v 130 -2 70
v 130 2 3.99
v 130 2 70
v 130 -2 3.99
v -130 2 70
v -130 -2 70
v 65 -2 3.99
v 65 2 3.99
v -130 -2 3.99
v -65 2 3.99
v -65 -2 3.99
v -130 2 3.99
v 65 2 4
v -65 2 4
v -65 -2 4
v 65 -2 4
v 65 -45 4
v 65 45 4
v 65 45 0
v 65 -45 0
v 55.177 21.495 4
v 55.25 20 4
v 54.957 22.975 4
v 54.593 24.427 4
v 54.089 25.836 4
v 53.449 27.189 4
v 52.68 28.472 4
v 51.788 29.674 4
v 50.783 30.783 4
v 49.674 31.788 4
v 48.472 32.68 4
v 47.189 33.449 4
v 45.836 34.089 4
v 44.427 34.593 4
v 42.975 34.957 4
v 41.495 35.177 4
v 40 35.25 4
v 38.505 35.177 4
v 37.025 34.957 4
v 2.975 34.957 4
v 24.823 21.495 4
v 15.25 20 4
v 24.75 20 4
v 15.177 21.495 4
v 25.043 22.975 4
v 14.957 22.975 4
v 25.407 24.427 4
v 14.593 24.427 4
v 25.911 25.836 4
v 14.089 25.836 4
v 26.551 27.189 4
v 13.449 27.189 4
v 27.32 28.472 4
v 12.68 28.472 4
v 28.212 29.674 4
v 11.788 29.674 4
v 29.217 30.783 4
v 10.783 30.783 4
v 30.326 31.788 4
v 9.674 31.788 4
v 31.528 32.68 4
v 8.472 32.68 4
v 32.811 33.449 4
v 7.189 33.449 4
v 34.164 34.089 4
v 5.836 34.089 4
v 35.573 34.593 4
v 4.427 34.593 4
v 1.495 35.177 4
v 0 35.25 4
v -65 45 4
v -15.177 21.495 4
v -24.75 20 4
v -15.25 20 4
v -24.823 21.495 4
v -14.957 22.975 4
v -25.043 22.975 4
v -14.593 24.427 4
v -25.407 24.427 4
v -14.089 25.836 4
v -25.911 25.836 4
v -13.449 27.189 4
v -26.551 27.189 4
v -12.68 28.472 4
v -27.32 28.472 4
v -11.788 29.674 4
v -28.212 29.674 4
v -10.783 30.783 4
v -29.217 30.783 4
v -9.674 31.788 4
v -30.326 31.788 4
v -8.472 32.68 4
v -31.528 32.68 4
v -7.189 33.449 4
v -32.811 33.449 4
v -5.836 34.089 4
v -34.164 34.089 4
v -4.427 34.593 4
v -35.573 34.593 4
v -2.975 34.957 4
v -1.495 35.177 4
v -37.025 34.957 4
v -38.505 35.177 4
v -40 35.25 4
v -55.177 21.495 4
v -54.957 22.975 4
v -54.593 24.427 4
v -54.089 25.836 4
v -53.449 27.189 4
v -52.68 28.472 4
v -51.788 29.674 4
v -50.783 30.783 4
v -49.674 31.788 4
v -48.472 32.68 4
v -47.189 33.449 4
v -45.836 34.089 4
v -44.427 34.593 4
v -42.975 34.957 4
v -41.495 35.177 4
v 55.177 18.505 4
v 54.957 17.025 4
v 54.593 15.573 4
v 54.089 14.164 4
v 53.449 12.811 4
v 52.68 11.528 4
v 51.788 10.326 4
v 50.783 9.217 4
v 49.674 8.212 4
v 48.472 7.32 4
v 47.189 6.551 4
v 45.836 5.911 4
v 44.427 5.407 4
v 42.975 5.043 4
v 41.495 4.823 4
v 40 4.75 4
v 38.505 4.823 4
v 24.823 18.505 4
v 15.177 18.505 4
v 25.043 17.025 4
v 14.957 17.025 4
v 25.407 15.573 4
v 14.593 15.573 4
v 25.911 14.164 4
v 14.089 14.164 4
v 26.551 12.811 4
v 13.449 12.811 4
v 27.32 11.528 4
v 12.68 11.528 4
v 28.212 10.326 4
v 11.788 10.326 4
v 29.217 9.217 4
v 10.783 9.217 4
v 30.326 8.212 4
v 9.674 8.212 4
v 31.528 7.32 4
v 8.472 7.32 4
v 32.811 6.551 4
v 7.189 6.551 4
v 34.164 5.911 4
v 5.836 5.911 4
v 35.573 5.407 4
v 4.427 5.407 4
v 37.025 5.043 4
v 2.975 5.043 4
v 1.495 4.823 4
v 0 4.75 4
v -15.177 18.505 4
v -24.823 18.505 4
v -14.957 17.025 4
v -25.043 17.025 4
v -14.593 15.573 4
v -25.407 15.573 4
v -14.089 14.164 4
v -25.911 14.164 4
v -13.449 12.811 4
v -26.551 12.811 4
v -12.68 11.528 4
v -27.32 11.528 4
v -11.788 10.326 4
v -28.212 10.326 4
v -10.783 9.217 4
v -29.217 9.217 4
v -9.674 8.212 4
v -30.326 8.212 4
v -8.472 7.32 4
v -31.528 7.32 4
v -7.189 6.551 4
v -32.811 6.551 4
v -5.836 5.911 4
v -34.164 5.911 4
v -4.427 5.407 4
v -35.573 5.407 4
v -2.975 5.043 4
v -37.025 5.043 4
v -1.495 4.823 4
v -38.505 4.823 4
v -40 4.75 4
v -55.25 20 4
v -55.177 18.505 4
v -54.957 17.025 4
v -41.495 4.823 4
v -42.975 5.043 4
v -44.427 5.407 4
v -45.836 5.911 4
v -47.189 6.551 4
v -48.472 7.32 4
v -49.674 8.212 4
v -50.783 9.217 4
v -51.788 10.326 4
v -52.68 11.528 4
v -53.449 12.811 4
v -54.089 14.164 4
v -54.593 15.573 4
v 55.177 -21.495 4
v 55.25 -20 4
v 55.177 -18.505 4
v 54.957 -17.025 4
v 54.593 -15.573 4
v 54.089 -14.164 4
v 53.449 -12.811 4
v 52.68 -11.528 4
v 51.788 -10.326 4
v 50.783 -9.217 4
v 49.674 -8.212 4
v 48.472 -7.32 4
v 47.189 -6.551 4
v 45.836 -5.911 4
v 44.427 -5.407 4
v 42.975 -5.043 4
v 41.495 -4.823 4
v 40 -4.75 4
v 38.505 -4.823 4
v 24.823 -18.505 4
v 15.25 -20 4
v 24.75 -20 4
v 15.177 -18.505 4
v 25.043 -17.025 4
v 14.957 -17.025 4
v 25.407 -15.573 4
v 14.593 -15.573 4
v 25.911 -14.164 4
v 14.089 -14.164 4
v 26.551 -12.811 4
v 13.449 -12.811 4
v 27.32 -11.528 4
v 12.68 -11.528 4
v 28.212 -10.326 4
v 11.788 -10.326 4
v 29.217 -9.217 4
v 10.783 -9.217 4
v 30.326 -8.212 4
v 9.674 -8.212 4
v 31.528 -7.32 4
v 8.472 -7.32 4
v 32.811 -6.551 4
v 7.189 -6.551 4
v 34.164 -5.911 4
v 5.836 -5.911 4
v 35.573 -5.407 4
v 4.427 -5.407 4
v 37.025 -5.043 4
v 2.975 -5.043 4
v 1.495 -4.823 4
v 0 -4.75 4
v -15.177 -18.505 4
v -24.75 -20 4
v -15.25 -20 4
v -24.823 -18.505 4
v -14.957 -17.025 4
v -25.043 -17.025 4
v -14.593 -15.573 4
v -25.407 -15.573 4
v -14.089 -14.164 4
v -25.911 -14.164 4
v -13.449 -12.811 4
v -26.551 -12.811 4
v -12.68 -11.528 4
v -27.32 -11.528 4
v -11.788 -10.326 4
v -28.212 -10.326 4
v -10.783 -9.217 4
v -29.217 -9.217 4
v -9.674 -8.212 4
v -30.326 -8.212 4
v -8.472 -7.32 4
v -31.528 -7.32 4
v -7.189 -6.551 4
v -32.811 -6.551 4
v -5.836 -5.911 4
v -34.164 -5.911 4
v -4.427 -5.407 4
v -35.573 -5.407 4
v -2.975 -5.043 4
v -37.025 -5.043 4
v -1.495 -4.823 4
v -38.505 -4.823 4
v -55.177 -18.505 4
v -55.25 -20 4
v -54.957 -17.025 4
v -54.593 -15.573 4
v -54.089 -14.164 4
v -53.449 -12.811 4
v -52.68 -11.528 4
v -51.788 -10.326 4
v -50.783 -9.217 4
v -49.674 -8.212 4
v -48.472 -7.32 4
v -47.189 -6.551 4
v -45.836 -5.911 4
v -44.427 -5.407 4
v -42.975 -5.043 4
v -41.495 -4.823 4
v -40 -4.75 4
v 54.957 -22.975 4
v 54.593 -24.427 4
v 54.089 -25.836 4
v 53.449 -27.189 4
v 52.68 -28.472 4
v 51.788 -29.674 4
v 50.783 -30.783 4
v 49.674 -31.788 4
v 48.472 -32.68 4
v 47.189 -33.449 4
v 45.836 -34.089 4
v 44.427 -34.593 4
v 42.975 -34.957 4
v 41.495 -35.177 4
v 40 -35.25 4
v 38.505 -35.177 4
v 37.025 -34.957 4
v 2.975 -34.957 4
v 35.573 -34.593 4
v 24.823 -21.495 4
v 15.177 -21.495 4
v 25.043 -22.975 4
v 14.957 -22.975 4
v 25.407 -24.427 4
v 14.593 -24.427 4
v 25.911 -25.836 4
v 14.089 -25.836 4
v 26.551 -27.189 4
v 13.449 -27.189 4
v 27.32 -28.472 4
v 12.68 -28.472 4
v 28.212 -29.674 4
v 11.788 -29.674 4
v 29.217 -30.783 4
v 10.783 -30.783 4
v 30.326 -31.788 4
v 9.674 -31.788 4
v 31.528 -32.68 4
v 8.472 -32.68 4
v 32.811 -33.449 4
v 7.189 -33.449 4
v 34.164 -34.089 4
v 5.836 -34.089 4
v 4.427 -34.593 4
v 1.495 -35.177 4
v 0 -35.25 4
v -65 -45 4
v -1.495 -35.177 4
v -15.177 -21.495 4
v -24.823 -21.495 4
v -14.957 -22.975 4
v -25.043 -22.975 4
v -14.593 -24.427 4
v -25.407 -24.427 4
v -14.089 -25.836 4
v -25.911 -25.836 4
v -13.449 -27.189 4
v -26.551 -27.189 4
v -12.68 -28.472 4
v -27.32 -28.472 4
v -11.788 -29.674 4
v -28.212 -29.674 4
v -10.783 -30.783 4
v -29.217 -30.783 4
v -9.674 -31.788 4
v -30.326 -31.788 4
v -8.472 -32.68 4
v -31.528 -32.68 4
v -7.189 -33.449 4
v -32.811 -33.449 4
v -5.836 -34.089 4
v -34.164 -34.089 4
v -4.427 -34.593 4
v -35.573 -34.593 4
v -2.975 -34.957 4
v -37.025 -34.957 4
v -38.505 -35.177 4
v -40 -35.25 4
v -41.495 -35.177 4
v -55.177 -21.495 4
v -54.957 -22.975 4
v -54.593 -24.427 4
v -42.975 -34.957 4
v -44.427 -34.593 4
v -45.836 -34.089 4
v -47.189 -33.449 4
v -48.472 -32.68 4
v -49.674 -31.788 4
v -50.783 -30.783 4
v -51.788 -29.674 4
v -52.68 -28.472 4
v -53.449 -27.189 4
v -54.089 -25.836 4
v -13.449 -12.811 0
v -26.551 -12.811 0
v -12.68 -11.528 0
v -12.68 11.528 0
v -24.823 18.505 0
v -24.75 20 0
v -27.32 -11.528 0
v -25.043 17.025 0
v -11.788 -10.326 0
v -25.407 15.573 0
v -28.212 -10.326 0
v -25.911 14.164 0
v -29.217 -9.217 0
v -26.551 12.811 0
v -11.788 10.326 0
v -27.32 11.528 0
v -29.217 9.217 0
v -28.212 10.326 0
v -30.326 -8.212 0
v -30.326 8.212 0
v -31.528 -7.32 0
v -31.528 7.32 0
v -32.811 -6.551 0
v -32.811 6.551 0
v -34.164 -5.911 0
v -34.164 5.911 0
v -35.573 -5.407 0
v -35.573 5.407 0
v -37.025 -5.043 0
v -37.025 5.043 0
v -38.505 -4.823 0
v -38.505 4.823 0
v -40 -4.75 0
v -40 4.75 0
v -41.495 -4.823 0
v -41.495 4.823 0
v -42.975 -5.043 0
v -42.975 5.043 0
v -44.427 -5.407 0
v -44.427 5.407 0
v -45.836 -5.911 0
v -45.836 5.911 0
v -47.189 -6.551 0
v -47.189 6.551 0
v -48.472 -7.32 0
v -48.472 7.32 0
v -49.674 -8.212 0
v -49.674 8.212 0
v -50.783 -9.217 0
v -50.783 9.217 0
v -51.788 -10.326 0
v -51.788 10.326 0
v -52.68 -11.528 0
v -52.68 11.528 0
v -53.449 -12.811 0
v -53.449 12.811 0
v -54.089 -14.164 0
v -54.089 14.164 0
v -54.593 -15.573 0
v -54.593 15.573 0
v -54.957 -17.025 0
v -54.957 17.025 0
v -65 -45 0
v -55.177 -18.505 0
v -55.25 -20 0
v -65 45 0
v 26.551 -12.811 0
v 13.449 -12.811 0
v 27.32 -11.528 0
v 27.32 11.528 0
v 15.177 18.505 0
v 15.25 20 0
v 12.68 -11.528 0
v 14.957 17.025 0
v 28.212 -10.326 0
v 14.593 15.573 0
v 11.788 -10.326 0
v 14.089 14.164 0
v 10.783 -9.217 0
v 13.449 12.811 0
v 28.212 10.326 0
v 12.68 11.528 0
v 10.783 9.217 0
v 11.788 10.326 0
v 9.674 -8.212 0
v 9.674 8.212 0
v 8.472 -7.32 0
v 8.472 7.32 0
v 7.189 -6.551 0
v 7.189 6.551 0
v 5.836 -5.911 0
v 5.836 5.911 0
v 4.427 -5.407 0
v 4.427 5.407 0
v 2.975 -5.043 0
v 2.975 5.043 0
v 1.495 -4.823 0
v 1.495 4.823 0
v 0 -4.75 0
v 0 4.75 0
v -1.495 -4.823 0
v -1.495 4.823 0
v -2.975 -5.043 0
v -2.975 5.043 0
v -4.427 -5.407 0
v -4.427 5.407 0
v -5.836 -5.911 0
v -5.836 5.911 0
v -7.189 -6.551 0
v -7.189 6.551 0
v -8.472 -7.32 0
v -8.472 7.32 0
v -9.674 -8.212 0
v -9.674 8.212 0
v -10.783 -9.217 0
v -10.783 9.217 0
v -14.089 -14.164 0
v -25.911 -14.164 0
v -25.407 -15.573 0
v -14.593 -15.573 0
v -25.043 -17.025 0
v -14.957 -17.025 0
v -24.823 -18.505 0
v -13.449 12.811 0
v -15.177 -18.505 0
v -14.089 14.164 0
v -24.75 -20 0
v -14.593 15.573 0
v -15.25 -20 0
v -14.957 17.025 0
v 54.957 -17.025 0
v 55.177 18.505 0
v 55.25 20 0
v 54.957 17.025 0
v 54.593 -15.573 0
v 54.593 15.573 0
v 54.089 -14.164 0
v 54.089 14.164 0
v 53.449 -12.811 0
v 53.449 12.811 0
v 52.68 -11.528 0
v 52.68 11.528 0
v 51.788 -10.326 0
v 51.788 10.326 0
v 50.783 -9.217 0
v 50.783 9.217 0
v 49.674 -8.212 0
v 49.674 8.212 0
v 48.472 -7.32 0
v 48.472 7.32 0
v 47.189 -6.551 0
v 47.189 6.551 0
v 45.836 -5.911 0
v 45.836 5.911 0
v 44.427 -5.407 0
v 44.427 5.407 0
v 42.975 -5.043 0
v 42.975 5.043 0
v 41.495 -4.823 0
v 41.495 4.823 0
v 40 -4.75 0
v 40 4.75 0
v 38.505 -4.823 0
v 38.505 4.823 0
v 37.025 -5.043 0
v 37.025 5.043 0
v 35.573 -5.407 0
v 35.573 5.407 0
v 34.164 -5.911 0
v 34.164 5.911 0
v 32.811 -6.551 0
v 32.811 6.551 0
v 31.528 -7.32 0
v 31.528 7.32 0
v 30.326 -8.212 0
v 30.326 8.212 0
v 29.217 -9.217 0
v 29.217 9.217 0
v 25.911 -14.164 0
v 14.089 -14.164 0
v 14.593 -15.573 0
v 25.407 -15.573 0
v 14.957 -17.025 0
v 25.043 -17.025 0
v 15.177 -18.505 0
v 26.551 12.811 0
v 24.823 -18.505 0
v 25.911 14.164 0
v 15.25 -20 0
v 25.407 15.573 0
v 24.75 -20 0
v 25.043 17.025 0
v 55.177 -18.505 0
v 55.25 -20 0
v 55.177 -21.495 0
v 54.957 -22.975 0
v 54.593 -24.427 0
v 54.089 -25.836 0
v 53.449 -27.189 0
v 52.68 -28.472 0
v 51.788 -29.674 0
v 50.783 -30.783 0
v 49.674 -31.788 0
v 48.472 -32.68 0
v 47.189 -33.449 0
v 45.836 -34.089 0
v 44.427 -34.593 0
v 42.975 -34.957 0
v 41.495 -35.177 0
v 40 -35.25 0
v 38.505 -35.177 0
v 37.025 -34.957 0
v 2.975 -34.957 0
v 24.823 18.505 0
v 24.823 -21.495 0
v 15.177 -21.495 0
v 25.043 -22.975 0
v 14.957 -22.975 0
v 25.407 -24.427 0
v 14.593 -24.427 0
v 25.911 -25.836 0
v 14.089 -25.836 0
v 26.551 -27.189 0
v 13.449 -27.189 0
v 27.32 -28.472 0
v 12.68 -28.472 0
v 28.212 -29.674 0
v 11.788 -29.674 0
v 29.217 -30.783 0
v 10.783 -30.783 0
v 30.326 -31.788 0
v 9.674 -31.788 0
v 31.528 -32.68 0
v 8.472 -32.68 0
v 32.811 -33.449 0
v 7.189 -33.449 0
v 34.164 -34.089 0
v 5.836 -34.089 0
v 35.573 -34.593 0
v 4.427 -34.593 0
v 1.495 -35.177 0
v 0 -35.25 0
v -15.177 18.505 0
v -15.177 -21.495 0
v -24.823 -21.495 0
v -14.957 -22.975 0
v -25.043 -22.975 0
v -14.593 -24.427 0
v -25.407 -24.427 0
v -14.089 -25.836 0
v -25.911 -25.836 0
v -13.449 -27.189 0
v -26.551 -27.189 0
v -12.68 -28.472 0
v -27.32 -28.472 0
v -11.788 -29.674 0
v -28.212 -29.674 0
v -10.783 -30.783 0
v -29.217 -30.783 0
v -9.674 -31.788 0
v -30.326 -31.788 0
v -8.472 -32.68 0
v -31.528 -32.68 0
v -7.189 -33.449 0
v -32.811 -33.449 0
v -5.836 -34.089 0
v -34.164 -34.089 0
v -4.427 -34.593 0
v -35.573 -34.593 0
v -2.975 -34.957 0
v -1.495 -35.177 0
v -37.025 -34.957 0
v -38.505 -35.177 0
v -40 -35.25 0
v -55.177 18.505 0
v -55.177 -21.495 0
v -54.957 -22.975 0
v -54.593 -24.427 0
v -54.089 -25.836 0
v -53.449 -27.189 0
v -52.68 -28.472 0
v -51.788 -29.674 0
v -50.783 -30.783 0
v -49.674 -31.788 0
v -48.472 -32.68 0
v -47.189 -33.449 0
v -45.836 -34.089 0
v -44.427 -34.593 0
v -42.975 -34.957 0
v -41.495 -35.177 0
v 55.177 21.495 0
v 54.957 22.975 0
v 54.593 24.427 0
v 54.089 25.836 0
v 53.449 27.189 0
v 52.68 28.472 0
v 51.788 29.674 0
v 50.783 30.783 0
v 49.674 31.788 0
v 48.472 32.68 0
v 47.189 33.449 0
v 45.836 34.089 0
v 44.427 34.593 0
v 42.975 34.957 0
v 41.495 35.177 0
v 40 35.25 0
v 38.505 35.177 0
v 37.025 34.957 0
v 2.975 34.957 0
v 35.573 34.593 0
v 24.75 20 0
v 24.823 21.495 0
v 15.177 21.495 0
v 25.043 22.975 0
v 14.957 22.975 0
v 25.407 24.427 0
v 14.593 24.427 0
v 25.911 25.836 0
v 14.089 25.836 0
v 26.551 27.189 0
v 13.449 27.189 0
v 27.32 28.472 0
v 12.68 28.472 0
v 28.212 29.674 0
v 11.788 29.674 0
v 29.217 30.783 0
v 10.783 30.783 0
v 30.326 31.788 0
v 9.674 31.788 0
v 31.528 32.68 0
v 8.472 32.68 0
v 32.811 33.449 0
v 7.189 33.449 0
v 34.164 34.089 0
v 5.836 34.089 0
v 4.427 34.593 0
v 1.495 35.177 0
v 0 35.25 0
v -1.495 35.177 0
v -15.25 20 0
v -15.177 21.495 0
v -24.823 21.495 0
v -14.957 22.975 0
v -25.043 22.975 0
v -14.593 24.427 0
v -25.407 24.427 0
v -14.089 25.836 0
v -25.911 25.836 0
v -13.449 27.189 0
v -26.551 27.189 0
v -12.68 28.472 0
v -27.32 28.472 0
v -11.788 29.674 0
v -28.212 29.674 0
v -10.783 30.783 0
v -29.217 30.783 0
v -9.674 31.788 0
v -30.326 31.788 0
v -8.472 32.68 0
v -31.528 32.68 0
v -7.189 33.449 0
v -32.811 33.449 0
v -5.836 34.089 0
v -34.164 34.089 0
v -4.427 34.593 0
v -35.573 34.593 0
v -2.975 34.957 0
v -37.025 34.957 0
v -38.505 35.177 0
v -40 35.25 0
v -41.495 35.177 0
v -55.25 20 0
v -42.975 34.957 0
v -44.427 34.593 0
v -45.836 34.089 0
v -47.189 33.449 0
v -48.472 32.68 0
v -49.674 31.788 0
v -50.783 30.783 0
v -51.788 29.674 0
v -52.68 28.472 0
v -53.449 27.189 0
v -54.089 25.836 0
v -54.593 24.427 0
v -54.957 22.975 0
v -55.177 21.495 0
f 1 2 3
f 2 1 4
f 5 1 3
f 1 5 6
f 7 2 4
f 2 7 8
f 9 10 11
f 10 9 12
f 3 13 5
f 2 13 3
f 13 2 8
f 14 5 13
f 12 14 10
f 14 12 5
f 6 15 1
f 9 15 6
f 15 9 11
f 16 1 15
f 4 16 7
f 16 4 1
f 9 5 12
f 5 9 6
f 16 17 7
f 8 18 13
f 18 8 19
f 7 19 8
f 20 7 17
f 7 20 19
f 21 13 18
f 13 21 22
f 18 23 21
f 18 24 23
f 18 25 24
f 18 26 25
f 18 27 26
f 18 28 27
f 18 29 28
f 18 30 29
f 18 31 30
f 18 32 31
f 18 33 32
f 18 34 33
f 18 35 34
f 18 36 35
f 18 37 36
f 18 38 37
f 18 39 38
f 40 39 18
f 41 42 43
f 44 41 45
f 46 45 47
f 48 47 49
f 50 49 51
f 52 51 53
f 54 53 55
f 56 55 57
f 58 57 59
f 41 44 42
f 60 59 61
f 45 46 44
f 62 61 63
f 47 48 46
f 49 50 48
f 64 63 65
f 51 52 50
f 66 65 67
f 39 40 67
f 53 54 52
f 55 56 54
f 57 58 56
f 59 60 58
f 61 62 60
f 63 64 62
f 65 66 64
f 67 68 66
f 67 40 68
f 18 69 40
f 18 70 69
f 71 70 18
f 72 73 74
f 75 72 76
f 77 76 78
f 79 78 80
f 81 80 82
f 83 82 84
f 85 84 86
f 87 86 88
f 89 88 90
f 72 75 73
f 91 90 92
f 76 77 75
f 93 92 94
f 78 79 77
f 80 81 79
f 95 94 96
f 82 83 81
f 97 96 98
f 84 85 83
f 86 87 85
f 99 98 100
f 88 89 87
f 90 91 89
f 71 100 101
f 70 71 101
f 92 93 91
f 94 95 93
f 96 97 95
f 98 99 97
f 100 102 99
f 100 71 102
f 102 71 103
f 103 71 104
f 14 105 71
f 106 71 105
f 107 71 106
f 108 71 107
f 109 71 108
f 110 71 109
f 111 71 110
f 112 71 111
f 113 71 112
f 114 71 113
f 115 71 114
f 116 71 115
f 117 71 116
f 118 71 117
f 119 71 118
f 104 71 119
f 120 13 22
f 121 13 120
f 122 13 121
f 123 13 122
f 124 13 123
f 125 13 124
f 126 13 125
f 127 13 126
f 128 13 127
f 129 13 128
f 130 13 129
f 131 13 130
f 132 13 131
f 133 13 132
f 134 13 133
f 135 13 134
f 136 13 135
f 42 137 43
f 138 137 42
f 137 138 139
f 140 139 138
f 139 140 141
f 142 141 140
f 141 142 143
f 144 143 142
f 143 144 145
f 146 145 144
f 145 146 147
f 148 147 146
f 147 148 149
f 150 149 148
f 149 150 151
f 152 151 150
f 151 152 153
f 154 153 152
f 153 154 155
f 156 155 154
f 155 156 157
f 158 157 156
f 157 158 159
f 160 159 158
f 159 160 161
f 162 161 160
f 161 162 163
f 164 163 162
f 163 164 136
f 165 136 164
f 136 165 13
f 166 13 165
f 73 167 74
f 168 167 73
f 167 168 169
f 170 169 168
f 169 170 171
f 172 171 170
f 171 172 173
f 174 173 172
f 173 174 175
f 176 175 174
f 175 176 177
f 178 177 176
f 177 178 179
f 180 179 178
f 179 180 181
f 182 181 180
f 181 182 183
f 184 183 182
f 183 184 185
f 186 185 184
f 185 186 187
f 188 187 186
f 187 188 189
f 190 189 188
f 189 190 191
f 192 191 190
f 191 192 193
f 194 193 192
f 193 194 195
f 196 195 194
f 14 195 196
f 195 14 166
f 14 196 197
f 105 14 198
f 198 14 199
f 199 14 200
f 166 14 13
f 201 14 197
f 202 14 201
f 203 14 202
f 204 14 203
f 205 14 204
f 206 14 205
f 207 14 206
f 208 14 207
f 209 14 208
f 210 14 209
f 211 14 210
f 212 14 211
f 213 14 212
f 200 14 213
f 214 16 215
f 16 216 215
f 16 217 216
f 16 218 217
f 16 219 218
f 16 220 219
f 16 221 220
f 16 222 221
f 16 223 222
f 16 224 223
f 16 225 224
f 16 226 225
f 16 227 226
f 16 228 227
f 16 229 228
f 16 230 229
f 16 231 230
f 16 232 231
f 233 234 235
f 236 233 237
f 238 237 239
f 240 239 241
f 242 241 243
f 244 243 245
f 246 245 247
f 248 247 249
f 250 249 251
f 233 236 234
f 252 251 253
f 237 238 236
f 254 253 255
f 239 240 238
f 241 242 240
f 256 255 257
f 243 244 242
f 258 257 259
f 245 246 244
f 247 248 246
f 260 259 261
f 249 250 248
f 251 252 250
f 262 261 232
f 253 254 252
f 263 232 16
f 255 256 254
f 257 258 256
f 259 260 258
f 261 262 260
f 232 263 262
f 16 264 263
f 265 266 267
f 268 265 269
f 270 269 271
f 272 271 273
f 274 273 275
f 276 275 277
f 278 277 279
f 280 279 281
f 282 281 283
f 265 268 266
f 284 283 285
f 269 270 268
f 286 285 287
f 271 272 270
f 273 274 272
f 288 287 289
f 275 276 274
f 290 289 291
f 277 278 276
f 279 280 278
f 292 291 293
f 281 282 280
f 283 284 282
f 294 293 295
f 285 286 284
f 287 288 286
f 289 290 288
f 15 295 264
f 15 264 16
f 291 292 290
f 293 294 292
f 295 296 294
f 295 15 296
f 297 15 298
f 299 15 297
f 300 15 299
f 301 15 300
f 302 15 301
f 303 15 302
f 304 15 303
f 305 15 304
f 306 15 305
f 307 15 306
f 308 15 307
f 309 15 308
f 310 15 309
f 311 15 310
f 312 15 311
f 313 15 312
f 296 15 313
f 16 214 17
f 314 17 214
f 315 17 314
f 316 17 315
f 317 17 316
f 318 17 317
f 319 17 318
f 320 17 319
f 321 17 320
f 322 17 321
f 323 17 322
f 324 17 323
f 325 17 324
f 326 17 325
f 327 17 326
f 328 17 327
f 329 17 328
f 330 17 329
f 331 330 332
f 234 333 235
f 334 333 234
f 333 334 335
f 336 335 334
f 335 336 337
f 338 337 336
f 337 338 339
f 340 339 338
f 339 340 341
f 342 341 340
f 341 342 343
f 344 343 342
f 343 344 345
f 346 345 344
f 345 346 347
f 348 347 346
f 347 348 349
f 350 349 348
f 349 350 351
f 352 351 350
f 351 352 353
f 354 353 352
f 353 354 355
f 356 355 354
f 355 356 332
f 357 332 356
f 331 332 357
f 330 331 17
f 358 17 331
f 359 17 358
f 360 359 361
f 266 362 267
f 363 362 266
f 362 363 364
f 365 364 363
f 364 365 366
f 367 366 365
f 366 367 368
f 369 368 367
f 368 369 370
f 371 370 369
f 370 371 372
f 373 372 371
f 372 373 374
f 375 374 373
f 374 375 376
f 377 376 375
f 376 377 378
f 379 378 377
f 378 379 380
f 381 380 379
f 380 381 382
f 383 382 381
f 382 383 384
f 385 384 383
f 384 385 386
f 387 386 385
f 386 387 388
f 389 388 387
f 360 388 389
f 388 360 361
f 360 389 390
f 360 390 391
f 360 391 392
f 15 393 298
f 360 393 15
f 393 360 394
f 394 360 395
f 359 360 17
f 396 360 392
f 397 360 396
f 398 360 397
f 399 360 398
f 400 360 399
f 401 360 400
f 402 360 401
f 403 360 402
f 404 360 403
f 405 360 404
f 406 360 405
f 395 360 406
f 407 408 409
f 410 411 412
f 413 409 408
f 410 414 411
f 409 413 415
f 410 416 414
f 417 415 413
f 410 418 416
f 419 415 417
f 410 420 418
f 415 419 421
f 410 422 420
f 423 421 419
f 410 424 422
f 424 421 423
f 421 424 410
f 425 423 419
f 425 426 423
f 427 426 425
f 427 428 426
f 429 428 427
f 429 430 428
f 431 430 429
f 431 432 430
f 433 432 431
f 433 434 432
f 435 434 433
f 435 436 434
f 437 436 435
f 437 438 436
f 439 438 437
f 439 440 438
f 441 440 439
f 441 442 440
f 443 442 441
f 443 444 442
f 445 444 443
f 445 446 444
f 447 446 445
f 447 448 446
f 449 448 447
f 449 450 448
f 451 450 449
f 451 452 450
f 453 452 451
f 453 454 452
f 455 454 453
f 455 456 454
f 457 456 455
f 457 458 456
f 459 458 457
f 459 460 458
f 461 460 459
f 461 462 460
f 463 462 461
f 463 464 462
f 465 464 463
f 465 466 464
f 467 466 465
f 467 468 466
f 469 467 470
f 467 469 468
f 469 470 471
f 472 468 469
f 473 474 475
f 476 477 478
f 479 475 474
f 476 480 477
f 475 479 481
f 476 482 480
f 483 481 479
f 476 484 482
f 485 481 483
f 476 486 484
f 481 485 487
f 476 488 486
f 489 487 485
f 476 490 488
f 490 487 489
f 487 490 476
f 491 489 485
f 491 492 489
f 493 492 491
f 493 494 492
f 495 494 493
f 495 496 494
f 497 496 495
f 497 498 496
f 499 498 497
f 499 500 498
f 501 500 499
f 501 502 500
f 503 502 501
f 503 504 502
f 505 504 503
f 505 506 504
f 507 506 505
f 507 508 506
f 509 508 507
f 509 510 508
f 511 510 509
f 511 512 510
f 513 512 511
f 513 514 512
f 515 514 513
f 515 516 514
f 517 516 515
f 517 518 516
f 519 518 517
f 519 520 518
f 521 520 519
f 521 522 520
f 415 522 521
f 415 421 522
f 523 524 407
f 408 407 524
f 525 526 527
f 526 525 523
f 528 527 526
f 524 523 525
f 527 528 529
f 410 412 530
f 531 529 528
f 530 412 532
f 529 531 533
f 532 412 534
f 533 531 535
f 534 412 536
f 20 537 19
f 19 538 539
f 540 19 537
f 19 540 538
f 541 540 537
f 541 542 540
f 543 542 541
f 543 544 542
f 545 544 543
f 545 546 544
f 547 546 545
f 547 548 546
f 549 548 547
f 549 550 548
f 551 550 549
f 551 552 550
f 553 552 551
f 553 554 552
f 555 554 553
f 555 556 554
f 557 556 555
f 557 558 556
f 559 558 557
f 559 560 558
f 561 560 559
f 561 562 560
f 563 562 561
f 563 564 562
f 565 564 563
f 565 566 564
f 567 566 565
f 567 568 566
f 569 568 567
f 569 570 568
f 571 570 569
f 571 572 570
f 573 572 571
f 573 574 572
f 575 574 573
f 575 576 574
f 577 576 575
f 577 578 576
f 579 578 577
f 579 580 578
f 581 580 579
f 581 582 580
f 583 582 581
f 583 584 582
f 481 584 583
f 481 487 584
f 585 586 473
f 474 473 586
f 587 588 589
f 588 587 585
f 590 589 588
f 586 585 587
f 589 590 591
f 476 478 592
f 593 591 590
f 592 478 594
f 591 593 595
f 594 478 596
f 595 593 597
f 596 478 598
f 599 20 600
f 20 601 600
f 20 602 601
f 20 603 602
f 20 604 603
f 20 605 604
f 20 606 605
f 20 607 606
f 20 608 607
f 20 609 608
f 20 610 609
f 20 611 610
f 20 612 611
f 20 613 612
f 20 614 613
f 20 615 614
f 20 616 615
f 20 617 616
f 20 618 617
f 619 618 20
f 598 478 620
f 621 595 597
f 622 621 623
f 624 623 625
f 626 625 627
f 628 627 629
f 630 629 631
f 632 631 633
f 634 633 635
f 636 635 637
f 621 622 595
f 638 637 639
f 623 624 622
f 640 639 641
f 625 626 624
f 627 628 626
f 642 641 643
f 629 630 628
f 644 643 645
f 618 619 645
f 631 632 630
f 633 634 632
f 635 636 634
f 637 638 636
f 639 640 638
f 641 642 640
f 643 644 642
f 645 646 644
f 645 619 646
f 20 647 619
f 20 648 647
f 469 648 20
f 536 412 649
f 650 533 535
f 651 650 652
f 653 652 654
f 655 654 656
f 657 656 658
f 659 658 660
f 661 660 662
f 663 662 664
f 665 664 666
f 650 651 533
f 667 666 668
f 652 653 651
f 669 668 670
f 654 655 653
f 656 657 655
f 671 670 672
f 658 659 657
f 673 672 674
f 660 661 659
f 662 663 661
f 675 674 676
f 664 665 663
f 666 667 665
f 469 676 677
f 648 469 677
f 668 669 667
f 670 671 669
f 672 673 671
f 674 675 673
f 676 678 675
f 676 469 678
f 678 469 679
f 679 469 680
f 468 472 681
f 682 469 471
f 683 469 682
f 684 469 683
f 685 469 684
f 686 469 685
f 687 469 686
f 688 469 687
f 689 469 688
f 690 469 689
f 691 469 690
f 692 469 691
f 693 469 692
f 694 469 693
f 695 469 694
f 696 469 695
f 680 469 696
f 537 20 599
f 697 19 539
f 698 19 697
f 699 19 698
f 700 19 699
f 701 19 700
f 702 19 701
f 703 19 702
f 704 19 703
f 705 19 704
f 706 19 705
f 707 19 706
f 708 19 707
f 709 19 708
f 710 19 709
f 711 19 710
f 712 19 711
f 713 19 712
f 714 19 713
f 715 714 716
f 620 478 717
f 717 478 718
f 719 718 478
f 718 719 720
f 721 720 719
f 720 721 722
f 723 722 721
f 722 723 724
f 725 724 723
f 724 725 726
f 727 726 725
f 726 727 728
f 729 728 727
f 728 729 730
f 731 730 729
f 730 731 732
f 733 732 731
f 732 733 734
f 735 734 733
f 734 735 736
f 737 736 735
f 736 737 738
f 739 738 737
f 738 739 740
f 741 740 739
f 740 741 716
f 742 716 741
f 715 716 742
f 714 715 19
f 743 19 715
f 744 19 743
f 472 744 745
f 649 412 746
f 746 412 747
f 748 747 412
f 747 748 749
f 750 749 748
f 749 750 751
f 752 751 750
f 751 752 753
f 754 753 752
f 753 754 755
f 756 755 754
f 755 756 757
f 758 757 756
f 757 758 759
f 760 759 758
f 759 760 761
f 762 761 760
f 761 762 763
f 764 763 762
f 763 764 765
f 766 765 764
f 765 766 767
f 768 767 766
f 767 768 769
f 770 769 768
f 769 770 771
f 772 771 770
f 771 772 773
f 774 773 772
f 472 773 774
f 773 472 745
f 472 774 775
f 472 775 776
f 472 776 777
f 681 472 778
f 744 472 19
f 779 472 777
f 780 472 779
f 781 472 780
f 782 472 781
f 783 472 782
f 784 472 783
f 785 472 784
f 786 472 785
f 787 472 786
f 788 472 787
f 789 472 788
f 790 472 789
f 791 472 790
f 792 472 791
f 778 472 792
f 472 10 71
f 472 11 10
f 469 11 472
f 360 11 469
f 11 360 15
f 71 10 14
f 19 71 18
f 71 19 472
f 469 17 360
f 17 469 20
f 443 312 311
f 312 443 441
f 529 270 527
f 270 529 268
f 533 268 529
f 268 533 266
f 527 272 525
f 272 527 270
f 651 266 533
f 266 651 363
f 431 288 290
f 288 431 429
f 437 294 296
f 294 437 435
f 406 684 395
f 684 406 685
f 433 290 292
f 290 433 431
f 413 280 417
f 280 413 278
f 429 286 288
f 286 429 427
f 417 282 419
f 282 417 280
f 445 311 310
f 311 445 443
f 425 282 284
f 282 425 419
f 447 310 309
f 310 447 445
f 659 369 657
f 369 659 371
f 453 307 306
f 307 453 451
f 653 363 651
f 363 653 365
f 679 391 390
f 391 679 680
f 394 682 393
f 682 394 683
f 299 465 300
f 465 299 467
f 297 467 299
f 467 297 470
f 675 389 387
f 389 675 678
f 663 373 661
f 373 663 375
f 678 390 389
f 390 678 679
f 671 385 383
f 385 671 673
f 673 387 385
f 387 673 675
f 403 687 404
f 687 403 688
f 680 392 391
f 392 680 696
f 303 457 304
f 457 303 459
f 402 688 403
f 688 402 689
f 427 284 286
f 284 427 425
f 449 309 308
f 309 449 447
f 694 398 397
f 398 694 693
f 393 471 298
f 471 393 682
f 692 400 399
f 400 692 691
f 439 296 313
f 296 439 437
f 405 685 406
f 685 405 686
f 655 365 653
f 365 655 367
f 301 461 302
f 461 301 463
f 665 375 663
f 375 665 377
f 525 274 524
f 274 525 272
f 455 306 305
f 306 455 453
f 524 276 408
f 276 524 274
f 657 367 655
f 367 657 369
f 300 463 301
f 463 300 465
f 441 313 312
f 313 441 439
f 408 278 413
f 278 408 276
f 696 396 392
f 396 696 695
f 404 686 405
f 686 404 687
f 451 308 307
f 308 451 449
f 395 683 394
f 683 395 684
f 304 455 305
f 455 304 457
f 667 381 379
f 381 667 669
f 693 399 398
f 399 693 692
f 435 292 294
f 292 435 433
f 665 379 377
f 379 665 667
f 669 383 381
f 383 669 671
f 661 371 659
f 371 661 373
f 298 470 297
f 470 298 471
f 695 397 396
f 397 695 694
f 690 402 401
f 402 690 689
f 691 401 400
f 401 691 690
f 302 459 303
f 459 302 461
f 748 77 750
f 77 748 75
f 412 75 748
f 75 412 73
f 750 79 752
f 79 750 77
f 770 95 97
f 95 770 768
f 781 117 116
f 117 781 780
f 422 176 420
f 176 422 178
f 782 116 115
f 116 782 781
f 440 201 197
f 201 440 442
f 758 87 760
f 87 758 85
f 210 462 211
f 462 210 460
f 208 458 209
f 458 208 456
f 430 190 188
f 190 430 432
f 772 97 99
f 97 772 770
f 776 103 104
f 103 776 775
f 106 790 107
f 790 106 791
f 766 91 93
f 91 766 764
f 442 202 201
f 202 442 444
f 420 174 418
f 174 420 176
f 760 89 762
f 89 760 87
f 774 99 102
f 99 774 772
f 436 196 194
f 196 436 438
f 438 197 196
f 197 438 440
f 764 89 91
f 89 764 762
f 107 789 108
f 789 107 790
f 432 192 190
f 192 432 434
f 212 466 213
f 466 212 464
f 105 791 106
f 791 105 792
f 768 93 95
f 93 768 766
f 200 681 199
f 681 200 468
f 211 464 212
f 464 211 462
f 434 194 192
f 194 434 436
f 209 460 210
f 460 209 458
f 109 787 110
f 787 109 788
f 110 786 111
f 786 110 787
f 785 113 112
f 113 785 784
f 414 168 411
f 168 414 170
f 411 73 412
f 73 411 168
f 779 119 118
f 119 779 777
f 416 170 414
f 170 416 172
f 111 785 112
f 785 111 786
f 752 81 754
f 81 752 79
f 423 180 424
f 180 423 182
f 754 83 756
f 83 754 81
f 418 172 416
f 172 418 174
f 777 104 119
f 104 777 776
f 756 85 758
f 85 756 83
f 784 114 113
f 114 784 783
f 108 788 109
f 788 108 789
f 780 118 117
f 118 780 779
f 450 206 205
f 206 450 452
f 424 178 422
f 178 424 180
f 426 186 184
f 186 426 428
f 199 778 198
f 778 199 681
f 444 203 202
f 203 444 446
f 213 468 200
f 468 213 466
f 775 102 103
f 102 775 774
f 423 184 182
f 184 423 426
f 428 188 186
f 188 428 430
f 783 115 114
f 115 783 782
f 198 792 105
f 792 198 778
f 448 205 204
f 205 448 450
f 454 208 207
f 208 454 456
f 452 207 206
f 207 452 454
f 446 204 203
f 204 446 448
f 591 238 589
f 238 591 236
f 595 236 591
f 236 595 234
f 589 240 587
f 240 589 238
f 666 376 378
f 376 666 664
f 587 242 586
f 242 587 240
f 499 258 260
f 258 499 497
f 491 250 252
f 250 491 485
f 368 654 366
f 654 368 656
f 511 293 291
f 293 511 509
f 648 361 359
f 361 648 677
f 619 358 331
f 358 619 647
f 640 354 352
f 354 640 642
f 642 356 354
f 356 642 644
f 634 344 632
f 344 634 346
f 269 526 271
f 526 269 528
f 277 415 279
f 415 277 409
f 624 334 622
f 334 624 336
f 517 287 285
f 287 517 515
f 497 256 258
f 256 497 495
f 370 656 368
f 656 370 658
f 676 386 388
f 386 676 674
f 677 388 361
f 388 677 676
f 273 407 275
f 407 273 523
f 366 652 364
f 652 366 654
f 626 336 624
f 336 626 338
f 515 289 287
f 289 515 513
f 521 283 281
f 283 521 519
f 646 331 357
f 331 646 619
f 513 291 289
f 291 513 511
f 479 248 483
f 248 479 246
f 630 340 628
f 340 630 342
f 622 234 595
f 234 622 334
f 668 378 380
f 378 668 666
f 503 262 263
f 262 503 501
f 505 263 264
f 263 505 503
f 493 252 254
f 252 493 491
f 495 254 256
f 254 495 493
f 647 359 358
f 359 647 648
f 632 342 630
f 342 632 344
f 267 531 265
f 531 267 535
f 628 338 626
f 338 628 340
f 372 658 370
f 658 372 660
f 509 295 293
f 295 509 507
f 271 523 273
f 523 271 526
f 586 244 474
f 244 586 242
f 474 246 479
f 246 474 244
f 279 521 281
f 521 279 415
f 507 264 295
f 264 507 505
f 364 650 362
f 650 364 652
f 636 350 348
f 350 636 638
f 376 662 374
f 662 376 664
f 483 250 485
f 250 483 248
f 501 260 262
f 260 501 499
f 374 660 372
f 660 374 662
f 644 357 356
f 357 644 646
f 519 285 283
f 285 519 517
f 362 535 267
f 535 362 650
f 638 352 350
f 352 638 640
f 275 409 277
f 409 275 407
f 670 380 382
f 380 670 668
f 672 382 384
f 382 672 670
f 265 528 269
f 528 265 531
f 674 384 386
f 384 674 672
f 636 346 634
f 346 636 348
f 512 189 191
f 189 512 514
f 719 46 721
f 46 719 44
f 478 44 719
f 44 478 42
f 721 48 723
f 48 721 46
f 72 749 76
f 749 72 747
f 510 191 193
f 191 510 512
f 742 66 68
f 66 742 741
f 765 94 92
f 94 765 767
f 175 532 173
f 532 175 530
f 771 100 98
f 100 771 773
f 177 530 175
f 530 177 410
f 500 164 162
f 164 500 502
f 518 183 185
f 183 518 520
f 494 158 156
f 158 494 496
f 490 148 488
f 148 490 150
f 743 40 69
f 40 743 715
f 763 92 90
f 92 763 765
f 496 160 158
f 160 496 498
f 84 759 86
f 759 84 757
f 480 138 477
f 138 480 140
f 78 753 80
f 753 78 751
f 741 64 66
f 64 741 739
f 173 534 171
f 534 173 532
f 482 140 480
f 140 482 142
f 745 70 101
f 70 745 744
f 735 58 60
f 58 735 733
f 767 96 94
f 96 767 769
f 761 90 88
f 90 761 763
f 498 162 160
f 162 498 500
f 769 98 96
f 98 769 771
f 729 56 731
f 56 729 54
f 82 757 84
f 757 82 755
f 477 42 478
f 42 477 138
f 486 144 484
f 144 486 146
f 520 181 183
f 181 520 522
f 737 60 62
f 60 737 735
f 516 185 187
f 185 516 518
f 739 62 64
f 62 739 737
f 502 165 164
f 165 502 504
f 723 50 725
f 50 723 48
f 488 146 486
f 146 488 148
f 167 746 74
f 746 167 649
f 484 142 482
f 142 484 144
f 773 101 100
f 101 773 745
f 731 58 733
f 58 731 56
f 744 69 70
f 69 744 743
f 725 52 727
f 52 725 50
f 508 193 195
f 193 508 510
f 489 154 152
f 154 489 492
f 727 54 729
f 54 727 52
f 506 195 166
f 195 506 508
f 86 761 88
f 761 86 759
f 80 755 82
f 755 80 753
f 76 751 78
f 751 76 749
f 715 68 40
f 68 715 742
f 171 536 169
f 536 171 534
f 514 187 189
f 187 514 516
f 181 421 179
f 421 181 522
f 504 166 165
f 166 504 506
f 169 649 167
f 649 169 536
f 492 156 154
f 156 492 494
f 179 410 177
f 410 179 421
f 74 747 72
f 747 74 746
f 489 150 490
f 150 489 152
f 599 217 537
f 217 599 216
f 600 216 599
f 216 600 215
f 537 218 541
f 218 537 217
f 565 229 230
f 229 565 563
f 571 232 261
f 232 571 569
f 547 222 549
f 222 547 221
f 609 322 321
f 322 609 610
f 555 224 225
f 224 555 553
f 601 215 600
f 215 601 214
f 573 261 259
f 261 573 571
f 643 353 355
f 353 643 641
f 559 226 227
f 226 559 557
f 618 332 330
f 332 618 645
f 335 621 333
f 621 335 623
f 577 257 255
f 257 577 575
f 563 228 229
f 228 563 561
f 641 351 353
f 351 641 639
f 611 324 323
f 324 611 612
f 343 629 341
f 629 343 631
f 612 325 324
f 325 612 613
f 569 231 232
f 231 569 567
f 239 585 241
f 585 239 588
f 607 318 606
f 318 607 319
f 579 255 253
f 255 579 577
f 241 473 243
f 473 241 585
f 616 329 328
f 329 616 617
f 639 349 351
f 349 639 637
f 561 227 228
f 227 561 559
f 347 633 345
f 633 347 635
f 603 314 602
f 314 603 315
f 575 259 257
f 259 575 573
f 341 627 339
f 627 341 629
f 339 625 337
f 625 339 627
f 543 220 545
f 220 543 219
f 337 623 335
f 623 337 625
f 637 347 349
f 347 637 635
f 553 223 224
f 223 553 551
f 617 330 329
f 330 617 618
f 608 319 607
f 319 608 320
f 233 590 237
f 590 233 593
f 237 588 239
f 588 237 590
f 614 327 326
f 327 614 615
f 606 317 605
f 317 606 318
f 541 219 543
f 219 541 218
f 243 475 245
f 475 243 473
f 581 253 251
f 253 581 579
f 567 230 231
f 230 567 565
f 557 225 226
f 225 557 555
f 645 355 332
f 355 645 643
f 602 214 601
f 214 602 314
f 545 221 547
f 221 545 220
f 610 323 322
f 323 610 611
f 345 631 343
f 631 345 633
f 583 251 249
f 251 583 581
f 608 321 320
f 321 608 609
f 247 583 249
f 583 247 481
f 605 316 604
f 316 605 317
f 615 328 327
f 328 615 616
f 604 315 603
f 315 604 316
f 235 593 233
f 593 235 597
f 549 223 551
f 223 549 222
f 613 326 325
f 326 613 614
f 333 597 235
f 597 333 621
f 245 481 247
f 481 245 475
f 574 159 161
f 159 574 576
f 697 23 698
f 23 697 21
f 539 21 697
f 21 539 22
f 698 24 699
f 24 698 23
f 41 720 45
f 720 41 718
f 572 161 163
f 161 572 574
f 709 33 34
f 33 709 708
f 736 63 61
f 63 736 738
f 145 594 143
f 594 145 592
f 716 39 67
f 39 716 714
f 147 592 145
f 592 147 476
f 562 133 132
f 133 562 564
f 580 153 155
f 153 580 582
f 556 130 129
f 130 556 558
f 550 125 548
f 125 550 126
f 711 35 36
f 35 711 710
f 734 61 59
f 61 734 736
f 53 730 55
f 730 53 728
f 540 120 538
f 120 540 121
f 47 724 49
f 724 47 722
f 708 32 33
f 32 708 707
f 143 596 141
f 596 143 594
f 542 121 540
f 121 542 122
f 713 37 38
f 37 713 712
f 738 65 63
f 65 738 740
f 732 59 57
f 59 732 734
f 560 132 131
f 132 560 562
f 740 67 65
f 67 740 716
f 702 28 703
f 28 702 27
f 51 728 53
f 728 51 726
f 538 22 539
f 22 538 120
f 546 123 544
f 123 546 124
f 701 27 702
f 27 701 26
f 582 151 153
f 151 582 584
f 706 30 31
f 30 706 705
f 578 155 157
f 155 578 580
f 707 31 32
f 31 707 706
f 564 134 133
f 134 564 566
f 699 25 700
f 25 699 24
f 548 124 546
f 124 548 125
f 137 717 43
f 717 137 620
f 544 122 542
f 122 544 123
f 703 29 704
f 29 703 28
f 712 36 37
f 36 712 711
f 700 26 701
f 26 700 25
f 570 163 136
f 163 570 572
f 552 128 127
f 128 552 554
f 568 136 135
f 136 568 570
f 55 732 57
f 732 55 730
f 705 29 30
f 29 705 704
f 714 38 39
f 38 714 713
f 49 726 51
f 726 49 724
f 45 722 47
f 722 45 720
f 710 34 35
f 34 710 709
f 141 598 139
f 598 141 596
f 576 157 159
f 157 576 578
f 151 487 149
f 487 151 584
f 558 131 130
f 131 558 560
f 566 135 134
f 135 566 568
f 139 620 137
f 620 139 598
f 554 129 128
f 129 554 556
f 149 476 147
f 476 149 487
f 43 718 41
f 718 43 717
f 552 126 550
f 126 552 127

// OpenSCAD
// Rack for six 50 mL conical (Falcon-type) tubes
// Print orientation: flat plate on the bed, holes vertical.
// After printing, flip over so the two wall strips become legs.

$fn = 64;

// ---- Plate ----
plate_x = 130;      // plate length along X
plate_y = 90;       // plate width along Y
plate_t = 4;        // plate thickness (z = 0 to 4)

// ---- Holes ----
hole_d     = 30.5;  // tube hole diameter
hole_nx    = 3;     // holes along X
hole_ny    = 2;     // holes along Y
hole_pitch = 40;    // centre-to-centre spacing (both directions)

// ---- Walls ----
wall_len = plate_x; // wall length along X
wall_t   = 4;       // wall thickness along Y
wall_h   = 66;      // wall height above plate (z = 4 to 70)

eps = 0.5;          // cutter overshoot

difference() {
    union() {
        // Base plate
        translate([-plate_x/2, -plate_y/2, 0])
            cube([plate_x, plate_y, plate_t]);

        // Two solid walls along the long edges
        for (a = [0, 180])
            rotate([0, 0, a])
                translate([0, -wall_t/2, plate_t - 0.01])
                    cube([wall_len, wall_t, wall_h + 0.01]);
    }

    // Tube holes
    for (i = [0 : hole_nx - 1])
        for (j = [0 : hole_ny - 1])
            translate([(i - (hole_nx - 1)/2) * hole_pitch,
                       (j - (hole_ny - 1)/2) * hole_pitch,
                       -eps])
                cylinder(d = hole_d, h = plate_t + wall_h + 2*eps);
}
